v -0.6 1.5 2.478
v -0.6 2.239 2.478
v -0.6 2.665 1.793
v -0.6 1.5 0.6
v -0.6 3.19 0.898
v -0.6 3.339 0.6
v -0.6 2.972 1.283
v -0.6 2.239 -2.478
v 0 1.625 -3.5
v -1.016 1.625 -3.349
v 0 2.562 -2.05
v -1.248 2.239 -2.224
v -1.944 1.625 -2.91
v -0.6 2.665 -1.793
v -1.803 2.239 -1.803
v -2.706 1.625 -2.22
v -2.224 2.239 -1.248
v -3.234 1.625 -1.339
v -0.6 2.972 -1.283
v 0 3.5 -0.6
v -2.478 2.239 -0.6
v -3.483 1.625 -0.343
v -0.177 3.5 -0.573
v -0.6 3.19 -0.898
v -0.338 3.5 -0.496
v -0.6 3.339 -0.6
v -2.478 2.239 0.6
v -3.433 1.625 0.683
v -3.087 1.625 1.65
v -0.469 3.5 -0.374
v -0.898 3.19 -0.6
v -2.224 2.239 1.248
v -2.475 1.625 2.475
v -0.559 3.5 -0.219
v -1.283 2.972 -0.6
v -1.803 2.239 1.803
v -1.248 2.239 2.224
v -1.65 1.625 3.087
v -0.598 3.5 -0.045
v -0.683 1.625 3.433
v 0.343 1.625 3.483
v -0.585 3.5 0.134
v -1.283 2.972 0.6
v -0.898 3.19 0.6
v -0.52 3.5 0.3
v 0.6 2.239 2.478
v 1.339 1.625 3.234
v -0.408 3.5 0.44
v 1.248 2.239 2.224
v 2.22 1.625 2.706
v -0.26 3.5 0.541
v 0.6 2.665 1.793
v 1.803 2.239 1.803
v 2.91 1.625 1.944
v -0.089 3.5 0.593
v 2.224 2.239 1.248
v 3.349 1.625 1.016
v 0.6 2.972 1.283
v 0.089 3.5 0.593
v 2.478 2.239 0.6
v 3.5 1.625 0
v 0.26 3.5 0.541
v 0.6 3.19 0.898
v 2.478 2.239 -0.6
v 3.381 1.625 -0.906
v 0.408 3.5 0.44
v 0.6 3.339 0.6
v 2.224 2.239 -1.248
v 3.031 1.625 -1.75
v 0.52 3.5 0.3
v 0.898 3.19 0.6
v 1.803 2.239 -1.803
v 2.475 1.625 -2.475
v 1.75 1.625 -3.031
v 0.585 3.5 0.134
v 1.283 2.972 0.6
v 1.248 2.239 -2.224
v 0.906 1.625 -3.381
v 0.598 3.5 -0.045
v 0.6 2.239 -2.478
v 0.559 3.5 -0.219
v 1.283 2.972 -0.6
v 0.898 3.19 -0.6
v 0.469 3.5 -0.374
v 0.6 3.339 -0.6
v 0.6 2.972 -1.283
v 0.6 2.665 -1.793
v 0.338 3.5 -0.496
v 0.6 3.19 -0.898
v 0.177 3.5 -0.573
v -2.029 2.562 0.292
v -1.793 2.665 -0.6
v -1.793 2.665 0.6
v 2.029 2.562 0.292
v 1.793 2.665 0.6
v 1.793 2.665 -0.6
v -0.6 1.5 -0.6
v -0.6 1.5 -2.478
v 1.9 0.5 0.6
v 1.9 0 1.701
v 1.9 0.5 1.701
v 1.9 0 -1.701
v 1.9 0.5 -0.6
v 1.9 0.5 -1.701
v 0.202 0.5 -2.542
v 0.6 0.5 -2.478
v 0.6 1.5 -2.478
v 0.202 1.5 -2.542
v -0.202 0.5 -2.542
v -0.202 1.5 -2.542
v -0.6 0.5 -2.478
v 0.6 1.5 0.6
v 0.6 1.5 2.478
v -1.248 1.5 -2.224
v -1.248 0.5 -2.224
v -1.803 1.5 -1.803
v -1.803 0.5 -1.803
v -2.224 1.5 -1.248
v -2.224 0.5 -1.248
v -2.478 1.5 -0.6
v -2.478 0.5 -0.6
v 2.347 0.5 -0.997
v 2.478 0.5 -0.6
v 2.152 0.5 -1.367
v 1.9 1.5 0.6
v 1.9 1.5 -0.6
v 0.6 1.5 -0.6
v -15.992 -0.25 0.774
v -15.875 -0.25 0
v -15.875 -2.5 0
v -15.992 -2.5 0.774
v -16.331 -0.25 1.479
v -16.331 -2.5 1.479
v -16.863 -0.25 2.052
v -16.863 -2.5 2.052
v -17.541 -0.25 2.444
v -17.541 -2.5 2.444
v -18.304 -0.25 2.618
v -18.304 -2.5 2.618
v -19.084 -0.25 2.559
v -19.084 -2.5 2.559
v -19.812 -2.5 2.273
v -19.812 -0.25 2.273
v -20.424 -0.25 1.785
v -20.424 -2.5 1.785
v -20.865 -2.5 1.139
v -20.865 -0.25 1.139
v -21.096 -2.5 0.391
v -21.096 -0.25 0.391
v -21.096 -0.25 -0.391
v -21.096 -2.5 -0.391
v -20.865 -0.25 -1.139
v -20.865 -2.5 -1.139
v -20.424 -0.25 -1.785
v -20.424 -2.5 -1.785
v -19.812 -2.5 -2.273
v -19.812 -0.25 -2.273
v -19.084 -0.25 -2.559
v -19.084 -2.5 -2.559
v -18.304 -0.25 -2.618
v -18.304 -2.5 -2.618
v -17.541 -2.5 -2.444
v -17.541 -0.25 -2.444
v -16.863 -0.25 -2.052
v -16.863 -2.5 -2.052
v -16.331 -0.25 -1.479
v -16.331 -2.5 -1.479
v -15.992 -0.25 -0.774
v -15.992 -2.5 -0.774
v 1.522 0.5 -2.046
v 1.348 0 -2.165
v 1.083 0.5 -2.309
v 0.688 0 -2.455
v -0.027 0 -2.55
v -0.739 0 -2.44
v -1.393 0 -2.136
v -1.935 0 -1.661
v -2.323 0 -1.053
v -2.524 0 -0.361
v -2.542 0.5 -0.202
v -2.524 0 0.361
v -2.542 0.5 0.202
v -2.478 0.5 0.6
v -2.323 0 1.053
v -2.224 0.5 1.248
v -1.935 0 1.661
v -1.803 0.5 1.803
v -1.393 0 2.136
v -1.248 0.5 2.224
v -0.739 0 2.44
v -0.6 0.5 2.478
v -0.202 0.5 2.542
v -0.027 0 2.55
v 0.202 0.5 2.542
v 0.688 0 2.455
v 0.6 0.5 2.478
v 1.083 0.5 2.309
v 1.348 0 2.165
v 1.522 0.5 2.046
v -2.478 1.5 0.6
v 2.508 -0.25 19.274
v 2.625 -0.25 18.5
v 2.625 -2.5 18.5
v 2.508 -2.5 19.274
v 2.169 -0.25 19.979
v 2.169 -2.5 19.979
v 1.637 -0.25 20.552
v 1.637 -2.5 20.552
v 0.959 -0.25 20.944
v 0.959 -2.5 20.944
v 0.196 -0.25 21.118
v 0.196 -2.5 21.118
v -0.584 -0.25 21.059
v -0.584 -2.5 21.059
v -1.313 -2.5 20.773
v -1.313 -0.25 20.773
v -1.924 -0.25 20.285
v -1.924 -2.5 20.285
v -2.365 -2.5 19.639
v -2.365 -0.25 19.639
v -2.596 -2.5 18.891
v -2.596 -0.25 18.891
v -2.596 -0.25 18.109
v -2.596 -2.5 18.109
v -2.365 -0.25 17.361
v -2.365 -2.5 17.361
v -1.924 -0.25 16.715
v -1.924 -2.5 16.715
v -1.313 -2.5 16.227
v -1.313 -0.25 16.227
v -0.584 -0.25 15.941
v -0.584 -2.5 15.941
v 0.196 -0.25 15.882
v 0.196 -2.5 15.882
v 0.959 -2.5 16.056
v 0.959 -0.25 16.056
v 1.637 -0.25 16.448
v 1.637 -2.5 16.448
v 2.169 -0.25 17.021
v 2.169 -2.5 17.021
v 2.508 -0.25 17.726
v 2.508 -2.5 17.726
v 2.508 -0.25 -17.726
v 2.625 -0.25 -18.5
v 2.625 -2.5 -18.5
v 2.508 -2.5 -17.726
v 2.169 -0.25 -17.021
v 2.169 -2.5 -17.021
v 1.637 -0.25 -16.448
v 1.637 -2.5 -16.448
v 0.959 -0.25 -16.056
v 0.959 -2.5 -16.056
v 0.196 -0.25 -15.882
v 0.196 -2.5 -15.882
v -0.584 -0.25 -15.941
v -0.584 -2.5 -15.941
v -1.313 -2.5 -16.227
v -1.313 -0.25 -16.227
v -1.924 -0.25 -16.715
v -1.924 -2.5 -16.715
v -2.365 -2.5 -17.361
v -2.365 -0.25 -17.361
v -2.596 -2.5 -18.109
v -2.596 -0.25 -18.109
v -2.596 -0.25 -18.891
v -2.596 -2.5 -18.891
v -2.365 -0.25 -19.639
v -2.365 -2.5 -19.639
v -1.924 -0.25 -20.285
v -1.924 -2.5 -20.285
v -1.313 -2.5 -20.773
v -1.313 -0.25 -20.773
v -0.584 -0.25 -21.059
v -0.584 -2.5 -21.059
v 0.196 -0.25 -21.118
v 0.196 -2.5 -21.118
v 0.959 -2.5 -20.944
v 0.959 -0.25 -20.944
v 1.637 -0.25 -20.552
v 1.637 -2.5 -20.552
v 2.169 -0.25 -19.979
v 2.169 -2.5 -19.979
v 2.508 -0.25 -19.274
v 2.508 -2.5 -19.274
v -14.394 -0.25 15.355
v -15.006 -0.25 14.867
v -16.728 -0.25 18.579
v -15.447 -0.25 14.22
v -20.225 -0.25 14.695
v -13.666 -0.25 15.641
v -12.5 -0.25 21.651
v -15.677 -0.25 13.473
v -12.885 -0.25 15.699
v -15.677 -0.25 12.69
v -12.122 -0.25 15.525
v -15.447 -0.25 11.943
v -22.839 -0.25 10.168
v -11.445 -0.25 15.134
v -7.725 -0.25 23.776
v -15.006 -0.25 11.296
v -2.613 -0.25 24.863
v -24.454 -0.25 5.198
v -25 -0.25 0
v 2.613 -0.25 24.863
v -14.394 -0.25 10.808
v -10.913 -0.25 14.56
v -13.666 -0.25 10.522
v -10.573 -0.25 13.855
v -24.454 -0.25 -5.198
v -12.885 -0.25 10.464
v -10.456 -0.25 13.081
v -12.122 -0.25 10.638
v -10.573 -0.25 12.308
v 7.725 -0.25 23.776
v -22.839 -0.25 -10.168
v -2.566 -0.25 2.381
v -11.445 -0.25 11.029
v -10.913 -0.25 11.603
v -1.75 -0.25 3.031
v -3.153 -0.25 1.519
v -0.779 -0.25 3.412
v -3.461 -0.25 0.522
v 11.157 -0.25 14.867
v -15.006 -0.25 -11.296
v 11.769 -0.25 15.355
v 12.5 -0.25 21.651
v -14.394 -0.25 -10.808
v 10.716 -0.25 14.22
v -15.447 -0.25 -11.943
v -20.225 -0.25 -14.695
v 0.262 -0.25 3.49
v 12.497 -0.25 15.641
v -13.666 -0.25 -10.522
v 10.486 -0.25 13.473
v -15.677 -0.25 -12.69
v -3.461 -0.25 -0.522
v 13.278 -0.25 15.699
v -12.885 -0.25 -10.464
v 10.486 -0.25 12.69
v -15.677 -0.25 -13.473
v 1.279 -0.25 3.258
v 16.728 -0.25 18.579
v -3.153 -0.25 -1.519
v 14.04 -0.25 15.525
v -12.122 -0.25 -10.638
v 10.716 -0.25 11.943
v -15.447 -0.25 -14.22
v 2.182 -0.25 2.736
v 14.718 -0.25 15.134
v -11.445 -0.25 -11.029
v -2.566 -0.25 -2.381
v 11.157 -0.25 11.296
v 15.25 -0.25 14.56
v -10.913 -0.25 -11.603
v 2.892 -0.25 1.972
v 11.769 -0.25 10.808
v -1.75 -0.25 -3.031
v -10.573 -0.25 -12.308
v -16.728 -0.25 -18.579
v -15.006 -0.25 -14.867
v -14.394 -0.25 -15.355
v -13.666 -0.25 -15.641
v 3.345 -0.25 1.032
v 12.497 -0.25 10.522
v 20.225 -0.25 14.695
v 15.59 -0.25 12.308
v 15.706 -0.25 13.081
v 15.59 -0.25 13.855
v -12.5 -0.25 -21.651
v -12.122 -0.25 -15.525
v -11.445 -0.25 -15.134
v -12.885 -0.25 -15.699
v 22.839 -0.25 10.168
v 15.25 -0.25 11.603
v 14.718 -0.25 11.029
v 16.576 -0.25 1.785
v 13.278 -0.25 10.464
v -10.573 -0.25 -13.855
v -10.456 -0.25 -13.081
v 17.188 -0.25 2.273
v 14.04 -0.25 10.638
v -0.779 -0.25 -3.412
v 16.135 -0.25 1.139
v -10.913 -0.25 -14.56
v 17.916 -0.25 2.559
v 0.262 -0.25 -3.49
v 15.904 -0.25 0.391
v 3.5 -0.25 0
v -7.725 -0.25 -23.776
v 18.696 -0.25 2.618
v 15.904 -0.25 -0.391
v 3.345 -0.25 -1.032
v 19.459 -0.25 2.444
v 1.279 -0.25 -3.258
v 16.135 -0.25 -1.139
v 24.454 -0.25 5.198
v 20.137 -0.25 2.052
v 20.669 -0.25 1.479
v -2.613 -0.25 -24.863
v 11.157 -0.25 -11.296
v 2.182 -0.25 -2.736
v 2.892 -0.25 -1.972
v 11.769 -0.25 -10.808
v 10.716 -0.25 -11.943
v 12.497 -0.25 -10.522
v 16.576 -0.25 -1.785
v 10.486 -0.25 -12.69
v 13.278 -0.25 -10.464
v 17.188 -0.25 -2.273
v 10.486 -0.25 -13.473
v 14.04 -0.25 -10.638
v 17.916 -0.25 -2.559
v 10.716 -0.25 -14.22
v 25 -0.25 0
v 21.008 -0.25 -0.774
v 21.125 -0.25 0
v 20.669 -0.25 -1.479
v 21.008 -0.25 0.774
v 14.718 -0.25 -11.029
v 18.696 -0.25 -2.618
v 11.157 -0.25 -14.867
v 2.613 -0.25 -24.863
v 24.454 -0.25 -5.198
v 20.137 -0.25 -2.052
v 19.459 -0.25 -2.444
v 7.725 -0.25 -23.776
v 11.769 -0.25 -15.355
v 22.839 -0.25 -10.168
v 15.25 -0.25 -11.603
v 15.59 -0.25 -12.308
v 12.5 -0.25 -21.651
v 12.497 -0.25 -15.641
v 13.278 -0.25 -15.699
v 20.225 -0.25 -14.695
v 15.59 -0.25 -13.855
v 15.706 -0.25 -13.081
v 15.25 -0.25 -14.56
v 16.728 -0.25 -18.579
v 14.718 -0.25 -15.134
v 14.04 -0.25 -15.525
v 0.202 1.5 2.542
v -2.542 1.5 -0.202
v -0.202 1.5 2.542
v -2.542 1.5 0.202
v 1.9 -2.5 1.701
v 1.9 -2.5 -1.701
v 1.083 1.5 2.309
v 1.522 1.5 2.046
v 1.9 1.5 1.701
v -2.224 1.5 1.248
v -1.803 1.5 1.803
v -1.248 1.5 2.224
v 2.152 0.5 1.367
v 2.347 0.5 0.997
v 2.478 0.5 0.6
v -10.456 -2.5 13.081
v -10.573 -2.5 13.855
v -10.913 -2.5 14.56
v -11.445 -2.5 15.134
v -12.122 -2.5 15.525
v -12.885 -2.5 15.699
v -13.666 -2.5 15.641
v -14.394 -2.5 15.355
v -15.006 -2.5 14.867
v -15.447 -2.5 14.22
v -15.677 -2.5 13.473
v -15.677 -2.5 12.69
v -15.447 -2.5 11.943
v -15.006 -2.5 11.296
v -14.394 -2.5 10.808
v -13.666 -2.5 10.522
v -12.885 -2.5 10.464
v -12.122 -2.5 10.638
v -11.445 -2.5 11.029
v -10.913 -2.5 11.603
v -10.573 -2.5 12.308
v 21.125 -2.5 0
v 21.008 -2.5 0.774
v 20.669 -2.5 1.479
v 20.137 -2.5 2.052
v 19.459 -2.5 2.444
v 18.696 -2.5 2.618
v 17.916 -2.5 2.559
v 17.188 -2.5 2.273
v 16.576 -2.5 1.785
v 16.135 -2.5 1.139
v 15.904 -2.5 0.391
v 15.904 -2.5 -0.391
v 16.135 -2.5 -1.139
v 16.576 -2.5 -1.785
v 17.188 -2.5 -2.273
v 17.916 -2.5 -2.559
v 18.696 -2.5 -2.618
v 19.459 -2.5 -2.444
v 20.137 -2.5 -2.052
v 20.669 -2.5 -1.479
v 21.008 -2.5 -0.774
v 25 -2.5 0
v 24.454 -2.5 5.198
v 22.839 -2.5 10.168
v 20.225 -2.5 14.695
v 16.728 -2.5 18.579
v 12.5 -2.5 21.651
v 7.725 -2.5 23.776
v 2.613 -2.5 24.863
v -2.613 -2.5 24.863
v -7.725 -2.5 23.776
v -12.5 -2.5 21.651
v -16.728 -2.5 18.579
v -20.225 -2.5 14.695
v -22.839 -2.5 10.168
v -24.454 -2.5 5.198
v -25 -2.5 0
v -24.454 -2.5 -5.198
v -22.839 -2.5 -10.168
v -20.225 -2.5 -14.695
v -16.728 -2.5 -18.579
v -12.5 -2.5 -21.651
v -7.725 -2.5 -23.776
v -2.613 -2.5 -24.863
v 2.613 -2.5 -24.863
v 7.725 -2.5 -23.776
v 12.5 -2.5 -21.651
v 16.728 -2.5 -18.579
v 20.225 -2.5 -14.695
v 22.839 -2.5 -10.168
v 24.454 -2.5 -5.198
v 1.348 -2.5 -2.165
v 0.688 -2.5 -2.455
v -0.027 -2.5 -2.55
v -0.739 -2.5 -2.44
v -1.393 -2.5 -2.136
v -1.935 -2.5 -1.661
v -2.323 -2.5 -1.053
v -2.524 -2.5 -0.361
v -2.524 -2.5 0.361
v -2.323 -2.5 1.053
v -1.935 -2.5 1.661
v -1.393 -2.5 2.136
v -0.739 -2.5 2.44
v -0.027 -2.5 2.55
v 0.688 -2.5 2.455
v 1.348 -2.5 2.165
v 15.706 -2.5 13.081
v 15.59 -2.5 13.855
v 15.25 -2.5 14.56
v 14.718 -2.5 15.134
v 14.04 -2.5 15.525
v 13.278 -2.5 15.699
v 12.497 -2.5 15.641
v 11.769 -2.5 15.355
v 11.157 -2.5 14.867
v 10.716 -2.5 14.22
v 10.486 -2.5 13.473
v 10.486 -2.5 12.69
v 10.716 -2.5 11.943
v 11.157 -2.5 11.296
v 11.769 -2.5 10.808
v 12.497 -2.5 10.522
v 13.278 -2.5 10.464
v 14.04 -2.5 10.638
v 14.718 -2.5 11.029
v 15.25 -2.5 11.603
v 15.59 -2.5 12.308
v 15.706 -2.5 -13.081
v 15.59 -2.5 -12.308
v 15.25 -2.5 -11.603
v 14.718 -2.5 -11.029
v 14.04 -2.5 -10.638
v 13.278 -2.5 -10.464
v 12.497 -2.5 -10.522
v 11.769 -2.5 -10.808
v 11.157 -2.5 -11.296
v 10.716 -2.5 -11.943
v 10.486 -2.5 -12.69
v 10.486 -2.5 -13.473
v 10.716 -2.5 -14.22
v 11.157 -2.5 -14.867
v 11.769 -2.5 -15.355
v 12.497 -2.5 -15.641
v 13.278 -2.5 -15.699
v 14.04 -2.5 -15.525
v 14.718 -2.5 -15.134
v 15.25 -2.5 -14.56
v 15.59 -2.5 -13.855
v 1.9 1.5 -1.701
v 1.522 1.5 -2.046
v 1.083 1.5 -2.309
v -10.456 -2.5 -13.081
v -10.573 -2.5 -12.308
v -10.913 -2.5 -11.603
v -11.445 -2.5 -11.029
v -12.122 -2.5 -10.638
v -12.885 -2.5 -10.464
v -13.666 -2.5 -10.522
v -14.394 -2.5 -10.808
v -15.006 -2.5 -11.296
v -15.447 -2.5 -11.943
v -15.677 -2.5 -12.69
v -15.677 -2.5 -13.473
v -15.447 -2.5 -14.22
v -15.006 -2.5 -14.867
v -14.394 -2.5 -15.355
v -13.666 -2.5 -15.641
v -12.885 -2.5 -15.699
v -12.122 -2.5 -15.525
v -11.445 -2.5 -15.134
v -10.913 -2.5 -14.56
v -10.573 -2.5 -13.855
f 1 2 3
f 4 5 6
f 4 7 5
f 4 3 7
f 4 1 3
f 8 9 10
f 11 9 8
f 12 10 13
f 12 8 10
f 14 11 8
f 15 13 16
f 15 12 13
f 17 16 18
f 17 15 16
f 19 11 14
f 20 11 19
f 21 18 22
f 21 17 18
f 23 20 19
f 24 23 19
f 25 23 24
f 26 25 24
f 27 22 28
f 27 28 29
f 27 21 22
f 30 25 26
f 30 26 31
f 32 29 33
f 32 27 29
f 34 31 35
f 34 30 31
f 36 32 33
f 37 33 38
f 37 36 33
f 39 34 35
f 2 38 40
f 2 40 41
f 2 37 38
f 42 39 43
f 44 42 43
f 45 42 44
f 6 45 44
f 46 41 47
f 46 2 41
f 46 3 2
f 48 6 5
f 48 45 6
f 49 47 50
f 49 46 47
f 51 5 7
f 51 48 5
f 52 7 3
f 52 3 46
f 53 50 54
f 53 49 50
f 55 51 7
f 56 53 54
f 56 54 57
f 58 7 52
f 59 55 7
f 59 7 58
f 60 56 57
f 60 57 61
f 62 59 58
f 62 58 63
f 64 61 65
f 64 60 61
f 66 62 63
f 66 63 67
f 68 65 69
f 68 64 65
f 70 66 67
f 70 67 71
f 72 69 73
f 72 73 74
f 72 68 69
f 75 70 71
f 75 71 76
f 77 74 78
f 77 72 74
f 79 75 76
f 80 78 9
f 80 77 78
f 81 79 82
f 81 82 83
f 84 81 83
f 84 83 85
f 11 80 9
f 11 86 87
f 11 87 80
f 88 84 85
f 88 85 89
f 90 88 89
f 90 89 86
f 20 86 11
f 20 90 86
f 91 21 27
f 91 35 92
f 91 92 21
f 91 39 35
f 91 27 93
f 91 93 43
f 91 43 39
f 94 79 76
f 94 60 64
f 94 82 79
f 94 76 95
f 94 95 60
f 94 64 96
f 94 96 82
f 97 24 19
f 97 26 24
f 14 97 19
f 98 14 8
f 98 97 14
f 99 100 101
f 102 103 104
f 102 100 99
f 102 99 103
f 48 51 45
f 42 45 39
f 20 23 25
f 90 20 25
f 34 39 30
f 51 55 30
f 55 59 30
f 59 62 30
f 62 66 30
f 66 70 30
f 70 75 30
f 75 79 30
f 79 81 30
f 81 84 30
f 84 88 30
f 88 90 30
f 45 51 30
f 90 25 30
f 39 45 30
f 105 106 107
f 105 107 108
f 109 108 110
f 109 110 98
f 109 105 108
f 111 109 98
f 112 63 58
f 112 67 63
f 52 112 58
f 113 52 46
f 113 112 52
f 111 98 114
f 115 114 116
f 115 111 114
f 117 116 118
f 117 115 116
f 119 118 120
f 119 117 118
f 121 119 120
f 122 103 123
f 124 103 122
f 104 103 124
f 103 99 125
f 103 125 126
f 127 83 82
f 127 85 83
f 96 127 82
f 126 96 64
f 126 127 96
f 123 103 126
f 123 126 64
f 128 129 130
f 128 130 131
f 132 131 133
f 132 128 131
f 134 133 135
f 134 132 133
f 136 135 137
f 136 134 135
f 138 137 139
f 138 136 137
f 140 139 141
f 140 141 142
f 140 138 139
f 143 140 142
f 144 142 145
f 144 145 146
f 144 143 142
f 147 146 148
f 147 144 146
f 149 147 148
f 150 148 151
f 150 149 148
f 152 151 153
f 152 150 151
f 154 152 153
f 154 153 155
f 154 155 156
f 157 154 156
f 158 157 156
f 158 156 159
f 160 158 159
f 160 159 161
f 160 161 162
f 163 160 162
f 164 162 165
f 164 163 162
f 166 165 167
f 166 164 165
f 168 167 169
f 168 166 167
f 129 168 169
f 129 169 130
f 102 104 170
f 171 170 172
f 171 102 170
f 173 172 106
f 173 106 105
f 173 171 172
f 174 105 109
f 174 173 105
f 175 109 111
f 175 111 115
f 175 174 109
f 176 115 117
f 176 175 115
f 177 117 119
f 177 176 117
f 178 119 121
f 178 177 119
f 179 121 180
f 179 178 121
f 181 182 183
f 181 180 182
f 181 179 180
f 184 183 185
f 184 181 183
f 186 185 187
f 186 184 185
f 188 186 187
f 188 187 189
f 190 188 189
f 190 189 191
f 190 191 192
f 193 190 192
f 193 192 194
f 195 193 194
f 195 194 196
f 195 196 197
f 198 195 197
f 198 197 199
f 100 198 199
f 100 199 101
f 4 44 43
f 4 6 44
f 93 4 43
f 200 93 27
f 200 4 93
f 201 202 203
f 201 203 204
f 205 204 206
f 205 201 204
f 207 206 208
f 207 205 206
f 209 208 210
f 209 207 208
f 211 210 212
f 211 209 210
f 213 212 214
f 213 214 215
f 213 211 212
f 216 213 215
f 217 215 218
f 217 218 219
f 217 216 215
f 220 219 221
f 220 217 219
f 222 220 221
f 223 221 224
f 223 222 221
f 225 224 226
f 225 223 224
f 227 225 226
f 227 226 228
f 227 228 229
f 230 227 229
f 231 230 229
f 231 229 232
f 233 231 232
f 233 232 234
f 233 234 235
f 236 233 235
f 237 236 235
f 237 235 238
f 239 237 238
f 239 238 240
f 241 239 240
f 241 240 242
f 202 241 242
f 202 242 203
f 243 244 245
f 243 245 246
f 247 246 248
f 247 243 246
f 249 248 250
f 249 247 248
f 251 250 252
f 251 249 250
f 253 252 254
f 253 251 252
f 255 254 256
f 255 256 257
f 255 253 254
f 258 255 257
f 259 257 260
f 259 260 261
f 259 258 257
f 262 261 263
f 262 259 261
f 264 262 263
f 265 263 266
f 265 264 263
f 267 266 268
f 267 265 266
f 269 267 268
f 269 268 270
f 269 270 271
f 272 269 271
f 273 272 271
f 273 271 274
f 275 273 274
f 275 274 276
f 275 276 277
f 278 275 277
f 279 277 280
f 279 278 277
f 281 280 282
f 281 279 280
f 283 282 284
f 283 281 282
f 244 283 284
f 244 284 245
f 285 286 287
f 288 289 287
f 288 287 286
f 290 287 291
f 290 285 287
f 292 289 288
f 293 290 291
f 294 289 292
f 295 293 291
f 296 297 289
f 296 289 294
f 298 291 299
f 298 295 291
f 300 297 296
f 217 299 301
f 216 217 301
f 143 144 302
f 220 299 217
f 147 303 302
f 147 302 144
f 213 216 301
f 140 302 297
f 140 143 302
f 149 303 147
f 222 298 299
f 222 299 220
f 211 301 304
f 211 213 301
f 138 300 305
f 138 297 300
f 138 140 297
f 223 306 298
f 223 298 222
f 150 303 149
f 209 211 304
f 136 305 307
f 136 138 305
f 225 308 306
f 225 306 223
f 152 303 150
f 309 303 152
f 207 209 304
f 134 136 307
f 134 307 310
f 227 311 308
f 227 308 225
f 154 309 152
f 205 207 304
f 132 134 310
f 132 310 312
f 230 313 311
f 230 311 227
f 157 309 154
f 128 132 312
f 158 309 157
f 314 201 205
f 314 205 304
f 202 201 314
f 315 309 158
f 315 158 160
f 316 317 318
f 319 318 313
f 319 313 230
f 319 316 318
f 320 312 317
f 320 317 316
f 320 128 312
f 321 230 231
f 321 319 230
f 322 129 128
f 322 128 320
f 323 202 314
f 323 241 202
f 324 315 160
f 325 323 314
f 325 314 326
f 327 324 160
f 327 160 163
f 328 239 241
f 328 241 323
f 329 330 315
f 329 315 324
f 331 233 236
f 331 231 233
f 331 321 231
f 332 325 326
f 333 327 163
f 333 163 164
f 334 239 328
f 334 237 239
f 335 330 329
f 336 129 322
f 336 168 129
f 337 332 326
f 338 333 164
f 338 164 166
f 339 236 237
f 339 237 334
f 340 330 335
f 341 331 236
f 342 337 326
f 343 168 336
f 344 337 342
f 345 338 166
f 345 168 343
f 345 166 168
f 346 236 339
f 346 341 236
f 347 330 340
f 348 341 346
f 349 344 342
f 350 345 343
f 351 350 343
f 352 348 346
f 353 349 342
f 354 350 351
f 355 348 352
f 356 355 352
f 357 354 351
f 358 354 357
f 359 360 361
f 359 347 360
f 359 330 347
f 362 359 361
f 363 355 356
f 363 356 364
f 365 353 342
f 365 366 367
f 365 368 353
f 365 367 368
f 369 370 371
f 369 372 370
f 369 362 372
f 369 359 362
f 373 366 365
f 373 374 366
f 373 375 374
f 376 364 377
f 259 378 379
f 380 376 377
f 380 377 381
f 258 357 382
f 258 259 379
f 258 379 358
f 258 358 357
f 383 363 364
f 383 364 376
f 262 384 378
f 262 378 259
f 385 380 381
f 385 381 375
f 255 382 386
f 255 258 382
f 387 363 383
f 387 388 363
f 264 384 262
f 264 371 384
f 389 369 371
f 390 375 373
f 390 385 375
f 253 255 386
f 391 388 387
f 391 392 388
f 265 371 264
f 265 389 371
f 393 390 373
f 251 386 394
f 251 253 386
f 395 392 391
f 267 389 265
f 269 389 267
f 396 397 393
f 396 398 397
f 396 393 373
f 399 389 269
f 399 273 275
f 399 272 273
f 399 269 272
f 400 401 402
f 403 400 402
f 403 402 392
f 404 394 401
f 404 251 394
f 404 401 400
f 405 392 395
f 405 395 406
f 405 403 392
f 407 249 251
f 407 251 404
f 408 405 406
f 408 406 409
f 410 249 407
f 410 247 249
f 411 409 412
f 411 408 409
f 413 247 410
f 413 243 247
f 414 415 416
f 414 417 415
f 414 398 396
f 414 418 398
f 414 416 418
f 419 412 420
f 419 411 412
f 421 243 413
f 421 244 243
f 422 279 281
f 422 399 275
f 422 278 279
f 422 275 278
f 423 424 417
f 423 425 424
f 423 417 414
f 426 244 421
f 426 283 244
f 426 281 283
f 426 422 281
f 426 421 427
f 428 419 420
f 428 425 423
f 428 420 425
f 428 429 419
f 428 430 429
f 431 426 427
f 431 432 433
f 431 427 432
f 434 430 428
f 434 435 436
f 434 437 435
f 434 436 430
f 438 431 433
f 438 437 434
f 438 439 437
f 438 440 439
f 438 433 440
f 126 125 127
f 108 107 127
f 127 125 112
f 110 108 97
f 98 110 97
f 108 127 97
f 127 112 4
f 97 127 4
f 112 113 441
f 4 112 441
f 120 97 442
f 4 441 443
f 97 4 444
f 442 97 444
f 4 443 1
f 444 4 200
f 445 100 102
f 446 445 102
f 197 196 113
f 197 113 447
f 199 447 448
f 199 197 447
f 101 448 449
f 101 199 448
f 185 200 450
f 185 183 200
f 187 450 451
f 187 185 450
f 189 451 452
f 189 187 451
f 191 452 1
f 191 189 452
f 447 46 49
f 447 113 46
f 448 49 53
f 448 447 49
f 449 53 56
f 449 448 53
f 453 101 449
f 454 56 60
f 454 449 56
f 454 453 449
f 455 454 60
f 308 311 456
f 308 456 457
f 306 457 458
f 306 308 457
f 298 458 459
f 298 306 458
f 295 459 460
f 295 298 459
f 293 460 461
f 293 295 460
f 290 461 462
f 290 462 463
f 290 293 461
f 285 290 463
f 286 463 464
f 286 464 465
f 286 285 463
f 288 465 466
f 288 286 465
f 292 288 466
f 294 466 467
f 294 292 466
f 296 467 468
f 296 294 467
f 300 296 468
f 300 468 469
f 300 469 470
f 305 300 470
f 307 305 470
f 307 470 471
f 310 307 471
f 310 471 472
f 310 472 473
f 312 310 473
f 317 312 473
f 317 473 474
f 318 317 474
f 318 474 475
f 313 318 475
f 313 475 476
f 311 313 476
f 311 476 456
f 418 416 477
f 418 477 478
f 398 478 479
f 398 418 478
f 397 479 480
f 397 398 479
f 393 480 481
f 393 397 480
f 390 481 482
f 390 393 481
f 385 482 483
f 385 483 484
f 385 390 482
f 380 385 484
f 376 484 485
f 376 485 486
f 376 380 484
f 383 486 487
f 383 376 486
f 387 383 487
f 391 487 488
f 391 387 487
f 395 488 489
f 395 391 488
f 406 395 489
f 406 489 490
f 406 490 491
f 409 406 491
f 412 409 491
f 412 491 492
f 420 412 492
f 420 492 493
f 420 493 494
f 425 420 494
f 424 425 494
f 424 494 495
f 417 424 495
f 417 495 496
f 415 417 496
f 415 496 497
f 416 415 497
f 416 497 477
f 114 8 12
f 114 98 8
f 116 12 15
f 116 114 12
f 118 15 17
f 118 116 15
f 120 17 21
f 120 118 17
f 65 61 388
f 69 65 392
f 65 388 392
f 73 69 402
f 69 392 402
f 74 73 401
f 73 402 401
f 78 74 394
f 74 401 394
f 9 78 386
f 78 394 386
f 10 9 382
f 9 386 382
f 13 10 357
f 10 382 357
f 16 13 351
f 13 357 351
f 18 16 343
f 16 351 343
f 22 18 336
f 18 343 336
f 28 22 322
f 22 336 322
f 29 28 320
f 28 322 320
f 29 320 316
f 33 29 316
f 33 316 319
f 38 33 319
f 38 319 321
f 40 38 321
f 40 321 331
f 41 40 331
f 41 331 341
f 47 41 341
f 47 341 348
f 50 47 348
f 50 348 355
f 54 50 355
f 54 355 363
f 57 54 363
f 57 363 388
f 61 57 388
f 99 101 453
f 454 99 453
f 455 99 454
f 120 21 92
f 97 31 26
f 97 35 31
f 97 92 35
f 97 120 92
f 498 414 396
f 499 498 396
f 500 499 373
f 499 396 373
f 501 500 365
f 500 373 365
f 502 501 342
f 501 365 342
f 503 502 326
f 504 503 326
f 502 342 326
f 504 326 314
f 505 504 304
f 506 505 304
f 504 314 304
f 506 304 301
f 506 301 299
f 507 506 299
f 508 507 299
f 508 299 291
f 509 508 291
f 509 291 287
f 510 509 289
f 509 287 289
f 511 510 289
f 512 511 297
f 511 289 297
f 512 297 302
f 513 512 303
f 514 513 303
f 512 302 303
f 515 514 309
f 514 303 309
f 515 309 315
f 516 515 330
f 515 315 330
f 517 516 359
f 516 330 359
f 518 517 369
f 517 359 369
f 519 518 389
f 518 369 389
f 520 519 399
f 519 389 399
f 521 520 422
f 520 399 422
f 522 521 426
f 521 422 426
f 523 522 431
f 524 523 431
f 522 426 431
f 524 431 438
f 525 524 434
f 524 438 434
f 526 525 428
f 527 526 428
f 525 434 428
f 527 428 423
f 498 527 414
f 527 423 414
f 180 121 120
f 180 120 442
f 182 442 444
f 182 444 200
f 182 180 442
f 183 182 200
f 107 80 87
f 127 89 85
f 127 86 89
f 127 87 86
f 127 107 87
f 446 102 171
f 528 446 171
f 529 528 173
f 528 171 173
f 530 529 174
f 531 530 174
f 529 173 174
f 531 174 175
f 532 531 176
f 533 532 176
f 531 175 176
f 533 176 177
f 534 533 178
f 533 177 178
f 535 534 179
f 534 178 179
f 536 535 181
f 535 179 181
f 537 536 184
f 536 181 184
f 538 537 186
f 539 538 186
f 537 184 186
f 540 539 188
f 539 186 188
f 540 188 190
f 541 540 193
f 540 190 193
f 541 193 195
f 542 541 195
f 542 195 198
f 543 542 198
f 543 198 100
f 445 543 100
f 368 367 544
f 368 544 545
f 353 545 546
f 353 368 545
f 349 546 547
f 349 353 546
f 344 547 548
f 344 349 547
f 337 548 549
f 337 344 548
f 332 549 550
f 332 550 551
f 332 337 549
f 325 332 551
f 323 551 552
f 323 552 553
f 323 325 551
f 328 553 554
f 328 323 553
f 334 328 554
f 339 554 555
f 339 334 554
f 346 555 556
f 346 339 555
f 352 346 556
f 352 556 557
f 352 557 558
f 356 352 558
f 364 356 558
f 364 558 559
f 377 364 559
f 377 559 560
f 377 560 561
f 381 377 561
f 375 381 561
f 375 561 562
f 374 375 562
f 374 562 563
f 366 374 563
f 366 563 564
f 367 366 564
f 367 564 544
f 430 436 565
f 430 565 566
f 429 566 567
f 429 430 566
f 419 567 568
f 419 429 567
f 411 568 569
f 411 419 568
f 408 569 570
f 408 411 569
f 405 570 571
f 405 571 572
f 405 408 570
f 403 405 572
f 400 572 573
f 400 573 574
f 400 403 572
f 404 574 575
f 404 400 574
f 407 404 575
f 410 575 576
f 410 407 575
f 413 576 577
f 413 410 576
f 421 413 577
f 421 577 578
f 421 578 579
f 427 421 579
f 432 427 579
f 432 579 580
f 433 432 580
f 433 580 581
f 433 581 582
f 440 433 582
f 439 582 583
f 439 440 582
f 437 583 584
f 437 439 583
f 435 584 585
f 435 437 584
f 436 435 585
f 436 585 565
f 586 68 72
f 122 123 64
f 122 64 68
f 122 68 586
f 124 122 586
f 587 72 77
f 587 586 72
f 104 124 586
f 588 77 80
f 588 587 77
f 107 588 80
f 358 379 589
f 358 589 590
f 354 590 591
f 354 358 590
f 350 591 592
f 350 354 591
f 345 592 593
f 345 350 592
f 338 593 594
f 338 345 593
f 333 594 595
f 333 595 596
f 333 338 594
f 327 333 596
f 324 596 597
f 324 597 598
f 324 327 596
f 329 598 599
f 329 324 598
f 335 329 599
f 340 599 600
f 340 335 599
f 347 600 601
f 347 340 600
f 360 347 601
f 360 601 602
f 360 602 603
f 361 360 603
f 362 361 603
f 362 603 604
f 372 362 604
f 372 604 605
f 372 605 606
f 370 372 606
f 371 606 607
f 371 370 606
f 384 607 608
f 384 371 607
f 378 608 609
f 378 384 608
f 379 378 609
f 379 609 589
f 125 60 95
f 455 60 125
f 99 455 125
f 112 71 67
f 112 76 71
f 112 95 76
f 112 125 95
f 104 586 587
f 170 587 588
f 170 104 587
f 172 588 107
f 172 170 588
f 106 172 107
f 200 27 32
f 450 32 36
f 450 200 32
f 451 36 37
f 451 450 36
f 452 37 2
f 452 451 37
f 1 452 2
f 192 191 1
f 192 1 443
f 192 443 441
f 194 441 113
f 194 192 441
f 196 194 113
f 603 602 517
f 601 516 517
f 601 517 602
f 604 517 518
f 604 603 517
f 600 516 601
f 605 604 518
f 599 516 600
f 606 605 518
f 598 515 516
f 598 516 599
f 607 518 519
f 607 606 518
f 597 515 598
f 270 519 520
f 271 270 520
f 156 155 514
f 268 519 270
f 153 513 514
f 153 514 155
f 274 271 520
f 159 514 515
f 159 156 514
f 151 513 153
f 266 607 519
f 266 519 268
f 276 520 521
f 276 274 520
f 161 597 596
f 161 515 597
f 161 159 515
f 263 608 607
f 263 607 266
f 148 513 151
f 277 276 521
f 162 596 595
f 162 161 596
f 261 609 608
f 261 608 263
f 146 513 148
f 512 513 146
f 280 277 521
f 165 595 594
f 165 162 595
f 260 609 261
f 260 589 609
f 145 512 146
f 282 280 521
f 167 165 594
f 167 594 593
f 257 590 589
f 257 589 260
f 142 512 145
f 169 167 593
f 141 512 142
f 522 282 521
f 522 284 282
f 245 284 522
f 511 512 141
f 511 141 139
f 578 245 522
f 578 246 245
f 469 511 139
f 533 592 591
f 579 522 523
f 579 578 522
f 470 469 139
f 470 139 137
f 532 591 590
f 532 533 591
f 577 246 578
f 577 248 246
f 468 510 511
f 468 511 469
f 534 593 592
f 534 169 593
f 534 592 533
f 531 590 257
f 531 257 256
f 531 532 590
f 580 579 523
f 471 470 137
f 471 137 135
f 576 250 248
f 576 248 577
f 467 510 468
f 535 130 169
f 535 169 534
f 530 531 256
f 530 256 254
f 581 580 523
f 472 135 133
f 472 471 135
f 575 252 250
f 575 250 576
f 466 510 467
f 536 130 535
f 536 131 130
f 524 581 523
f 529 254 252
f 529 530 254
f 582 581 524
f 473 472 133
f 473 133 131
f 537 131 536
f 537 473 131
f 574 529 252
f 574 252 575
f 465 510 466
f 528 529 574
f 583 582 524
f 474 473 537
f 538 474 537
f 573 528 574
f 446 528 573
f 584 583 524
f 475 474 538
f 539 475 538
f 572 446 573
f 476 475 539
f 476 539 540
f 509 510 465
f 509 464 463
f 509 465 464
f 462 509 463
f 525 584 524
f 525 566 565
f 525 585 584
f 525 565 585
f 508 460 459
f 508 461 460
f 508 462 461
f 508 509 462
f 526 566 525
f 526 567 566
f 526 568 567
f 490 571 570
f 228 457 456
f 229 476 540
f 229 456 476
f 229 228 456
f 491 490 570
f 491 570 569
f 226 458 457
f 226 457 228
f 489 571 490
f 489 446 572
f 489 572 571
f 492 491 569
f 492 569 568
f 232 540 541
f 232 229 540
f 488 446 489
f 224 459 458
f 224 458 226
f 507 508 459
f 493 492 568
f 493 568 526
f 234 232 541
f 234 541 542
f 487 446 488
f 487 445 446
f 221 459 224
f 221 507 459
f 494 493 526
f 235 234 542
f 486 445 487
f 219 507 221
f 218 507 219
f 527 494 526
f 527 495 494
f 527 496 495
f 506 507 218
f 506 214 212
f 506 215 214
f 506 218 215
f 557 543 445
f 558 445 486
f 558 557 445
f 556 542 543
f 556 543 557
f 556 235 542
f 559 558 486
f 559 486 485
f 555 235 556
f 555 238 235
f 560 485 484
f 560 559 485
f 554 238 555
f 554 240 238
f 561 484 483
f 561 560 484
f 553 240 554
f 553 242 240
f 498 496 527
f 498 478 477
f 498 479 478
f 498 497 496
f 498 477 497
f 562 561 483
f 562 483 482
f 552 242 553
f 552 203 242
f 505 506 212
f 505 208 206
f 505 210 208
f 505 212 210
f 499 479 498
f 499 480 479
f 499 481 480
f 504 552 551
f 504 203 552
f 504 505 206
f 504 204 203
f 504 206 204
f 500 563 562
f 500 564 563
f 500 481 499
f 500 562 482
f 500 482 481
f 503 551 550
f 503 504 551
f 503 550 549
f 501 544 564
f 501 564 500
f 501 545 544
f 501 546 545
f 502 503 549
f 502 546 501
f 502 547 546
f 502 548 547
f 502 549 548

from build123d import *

# Parameters (mm, degrees)
SKETCH1_R               = 25
BOSS_EXTRUDE1_DEPTH     = 3.5
SKETCH3_R               = 8.75
BOSS_EXTRUDE2_DEPTH     = 4
SKETCH4_R               = 2.625
CUT_EXTRUDE1_DEPTH      = 3.5
CUT_EXTRUDE2_DEPTH      = 10
CUT_EXTRUDE3_DEPTH      = 26
CUT_EXTRUDE3_DEPTH_BACK = 26
CUT_EXTRUDE4_DEPTH      = 26
CUT_EXTRUDE4_DEPTH_BACK = 26
SKETCH11_R              = 25
CUT_EXTRUDE5_DEPTH      = 3
BOSS_EXTRUDE3_DEPTH     = 3
SKETCH13_R              = 8.75
SKETCH13_R_2            = 2.55
BOSS_EXTRUDE4_DEPTH     = 3
SKETCH16_R              = 25
SKETCH16_R_2            = 2.625
BOSS_EXTRUDE5_DEPTH     = 2.5
SKETCH17_R              = 25
SKETCH17_R_2            = 8.75
CUT_EXTRUDE6_DEPTH      = 0.75
CUT_EXTRUDE7_DEPTH      = 1
SKETCH19_R              = 8.75
SKETCH19_R_2            = 3.5
CUT_EXTRUDE8_DEPTH      = 20
SKETCH20_R              = 6.415433717
CUT_EXTRUDE9_DEPTH      = 10
SKETCH22_R              = 3.5
CUT_EXTRUDE10_DEPTH     = 0.5


with BuildPart() as part:
    # Sketch1 → Boss-Extrude1 (new body)
    with BuildSketch(Plane(origin=(0, 0, 0), x_dir=(1, 0, 0), z_dir=(0, 1, 0))):
        Circle(SKETCH1_R)
    extrude(amount=BOSS_EXTRUDE1_DEPTH)

    # Sketch3 → Boss-Extrude2 (add)
    with BuildSketch(Plane(origin=(0, 3.5, 0), x_dir=(1, 0, 0), z_dir=(0, 1, 0))):
        Circle(SKETCH3_R)
    extrude(amount=BOSS_EXTRUDE2_DEPTH)

    # Sketch4 → Cut-Extrude1 (cut)
    with BuildSketch(Plane(origin=(0, 3.5, 0), x_dir=(1, 0, 0), z_dir=(0, 1, 0))):
        with Locations((0, 18.5)):
            Circle(SKETCH4_R)
        with Locations((13.081475452, 13.081475452)):
            Circle(SKETCH4_R)
        with Locations((18.5, 0)):
            Circle(SKETCH4_R)
        with Locations((13.081475452, -13.081475452)):
            Circle(SKETCH4_R)
        with Locations((0, -18.5)):
            Circle(SKETCH4_R)
        with Locations((-13.081475452, -13.081475452)):
            Circle(SKETCH4_R)
        with Locations((-18.5, 0)):
            Circle(SKETCH4_R)
        with Locations((-13.081475452, 13.081475452)):
            Circle(SKETCH4_R)
    extrude(amount=-CUT_EXTRUDE1_DEPTH, mode=Mode.SUBTRACT)

    # Sketch7 → Cut-Extrude2 (cut)
    with BuildSketch(Plane.XZ):
        with BuildLine():
            Line((1.9, 1.700735135), (1.9, -1.700735135))
            ThreePointArc((1.9, -1.700735135), (-2.55, 0), (1.9, 1.700735135))
        make_face()
    extrude(amount=-CUT_EXTRUDE2_DEPTH, mode=Mode.SUBTRACT)

    # Sketch8 → Cut-Extrude3 (cut, two sides)
    with BuildSketch(Plane(origin=(0, 0, 0), x_dir=(0, 0, -1), z_dir=(1, 0, 0))) as cut_extrude3_sk:
        with BuildLine():
            Line((-2.5, 6), (2.5, 6))
            ThreePointArc((2.5, 6), (3.5, 5), (2.5, 4))
            Line((2.5, 4), (-2.5, 4))
            ThreePointArc((-2.5, 4), (-3.5, 5), (-2.5, 6))
        make_face()
    extrude(amount=CUT_EXTRUDE3_DEPTH, mode=Mode.SUBTRACT)
    extrude(cut_extrude3_sk.sketch, amount=-CUT_EXTRUDE3_DEPTH_BACK, mode=Mode.SUBTRACT)

    # Sketch9 → Cut-Extrude4 (cut, two sides)
    with BuildSketch(Plane.XY) as cut_extrude4_sk:
        with BuildLine():
            Line((-2.5, 6), (2.5, 6))
            ThreePointArc((2.5, 6), (3.5, 5), (2.5, 4))
            Line((2.5, 4), (-2.5, 4))
            ThreePointArc((-2.5, 4), (-3.5, 5), (-2.5, 6))
        make_face()
    extrude(amount=CUT_EXTRUDE4_DEPTH, mode=Mode.SUBTRACT)
    extrude(cut_extrude4_sk.sketch, amount=-CUT_EXTRUDE4_DEPTH_BACK, mode=Mode.SUBTRACT)

    # Sketch11 → Cut-Extrude5 (cut)
    with BuildSketch(Plane(origin=(0, 3.5, 0), x_dir=(1, 0, 0), z_dir=(0, 1, 0))):
        Circle(SKETCH11_R)
    extrude(amount=-CUT_EXTRUDE5_DEPTH, mode=Mode.SUBTRACT)

    # Sketch12 → Boss-Extrude3 (add)
    with BuildSketch(Plane(origin=(0, 0.5, 0), x_dir=(1, 0, 0), z_dir=(0, 1, 0))):
        Polygon((0.6, 0.6), (5, 0.6), (5, -0.6), (0.6, -0.6), (0.6, -5), (-0.6, -5), (-0.6, -0.6), (-5, -0.6), (-5, 0.6), (-0.6, 0.6), (-0.6, 5), (0.6, 5), align=None)
    extrude(amount=BOSS_EXTRUDE3_DEPTH)

    # Sketch13 → Boss-Extrude4 (add)
    with BuildSketch(Plane(origin=(0, 0.5, 0), x_dir=(1, 0, 0), z_dir=(0, 1, 0))):
        Circle(SKETCH13_R)
        Circle(SKETCH13_R_2, mode=Mode.SUBTRACT)
    extrude(amount=BOSS_EXTRUDE4_DEPTH)

    # Sketch15 → Revolve1 (revolve)
    with BuildSketch(Plane.XY):
        Polygon((0, 13.5), (-8.75, 7.5), (0, 7.5), align=None)
    revolve(axis=Axis((0, -5.481339273, 0), (0, 1, 0)))

    # Sketch16 → Boss-Extrude5 (add)
    with BuildSketch(Plane.XZ):
        Circle(SKETCH16_R)
        with Locations((13.081475452, 13.081475452)):
            Circle(SKETCH16_R_2, mode=Mode.SUBTRACT)
        with Locations((0, 18.5)):
            Circle(SKETCH16_R_2, mode=Mode.SUBTRACT)
        with Locations((-13.081475452, 13.081475452)):
            Circle(SKETCH16_R_2, mode=Mode.SUBTRACT)
        with Locations((-18.5, 0)):
            Circle(SKETCH16_R_2, mode=Mode.SUBTRACT)
        with Locations((-13.081475452, -13.081475452)):
            Circle(SKETCH16_R_2, mode=Mode.SUBTRACT)
        with Locations((0, -18.5)):
            Circle(SKETCH16_R_2, mode=Mode.SUBTRACT)
        with Locations((13.081475452, -13.081475452)):
            Circle(SKETCH16_R_2, mode=Mode.SUBTRACT)
        with Locations((18.5, 0)):
            Circle(SKETCH16_R_2, mode=Mode.SUBTRACT)
        with BuildLine():
            Line((1.9, 1.700735135), (1.9, -1.700735135))
            ThreePointArc((1.9, -1.700735135), (-2.55, 0), (1.9, 1.700735135))
        make_face(mode=Mode.SUBTRACT)
    extrude(amount=BOSS_EXTRUDE5_DEPTH)

    # Sketch17 → Cut-Extrude6 (cut)
    with BuildSketch(Plane(origin=(0, 0.5, 0), x_dir=(1, 0, 0), z_dir=(0, 1, 0))):
        Circle(SKETCH17_R)
        Circle(SKETCH17_R_2, mode=Mode.SUBTRACT)
    extrude(amount=-CUT_EXTRUDE6_DEPTH, mode=Mode.SUBTRACT)

    # Sketch18 → Cut-Extrude7 (cut)
    with BuildSketch(Plane.XZ.offset(-0.5)):
        with BuildLine():
            Line((1.9, 1.700735135), (1.9, -1.700735135))
            ThreePointArc((1.9, -1.700735135), (-2.55, 0), (1.9, 1.700735135))
        make_face()
    extrude(amount=-CUT_EXTRUDE7_DEPTH, mode=Mode.SUBTRACT)

    # Sketch19 → Cut-Extrude8 (cut)
    with BuildSketch(Plane(origin=(0, -0.25, 0), x_dir=(1, 0, 0), z_dir=(0, 1, 0))):
        Circle(SKETCH19_R)
        Circle(SKETCH19_R_2, mode=Mode.SUBTRACT)
    extrude(amount=CUT_EXTRUDE8_DEPTH, mode=Mode.SUBTRACT)

    # Sketch20 → Cut-Extrude9 (cut)
    with BuildSketch(Plane.XZ.offset(-6)):
        Circle(SKETCH20_R)
    extrude(amount=-CUT_EXTRUDE9_DEPTH, mode=Mode.SUBTRACT)

    # Sketch22 → Cut-Extrude10 (cut)
    with BuildSketch(Plane(origin=(0, 4, 0), x_dir=(1, 0, 0), z_dir=(0, 1, 0))):
        Circle(SKETCH22_R)
    extrude(amount=-CUT_EXTRUDE10_DEPTH, mode=Mode.SUBTRACT)

    # Sketch23 → Cut-Revolve3 (revolve, cut)
    with BuildSketch(Plane(origin=(0, 0, 0), x_dir=(0, 0, -1), z_dir=(1, 0, 0))):
        Polygon((3.5, 1.625), (0.6, 3.5), (3.5, 3.5), align=None)
    revolve(axis=Axis((0, -5.481339273, 0), (0, 1, 0)), mode=Mode.SUBTRACT)


solid = part.part
